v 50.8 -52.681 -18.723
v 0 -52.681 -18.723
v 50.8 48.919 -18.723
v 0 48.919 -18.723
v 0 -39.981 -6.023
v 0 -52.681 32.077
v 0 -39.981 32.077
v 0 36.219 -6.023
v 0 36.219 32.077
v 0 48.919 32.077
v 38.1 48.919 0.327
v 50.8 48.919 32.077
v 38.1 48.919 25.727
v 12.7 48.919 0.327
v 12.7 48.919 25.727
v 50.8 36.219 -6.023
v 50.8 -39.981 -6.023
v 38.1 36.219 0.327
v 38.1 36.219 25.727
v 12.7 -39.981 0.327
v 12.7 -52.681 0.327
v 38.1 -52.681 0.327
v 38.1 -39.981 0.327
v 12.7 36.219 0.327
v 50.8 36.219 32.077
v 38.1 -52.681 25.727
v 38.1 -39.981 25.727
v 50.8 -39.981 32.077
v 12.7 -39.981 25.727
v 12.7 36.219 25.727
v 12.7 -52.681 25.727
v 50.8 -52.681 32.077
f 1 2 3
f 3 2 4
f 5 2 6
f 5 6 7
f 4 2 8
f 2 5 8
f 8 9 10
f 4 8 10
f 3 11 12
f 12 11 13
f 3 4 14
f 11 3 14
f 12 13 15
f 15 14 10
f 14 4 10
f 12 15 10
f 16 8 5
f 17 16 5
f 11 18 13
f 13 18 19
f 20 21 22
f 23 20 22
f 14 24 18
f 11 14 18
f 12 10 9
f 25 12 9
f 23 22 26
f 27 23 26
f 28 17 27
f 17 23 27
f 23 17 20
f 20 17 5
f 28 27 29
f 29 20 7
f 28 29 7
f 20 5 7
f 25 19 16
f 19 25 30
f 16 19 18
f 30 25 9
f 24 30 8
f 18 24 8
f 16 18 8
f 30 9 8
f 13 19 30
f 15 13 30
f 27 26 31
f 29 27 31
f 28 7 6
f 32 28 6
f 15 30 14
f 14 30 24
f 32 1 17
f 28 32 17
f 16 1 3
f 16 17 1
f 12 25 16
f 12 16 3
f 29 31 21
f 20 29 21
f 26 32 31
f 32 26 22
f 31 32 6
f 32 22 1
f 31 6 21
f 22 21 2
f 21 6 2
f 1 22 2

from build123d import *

# Parameters (mm, degrees)
F1_DEPTH = 50.8
F3_DEPTH = 114.3


with BuildPart() as f1:
    # F0 (on Right) → F1 (new body)
    with BuildSketch(Plane.YZ):
        Polygon((-52.681003, -18.723272), (-39.981003, -18.723272), (48.918997, -18.723272), (48.918997, 32.076728), (36.218997, 32.076728), (36.218997, -6.023272), (-39.981003, -6.023272), (-39.981003, 32.076728), (-52.681003, 32.076728), align=None)
    extrude(amount=F1_DEPTH)

    # F2 (on face) → F3 (cut, symmetric)
    with BuildSketch(Plane.XZ.offset(52.681003)):
        Polygon((24.353357, 0.326728), (38.1, 0.326728), (38.1, 13.026728), (38.1, 25.726728), (25.4, 25.726728), (12.7, 25.726728), (12.7, 9.816655), (12.7, 0.326728), align=None)
    extrude(amount=F3_DEPTH, both=True, mode=Mode.SUBTRACT)


solid = f1.part
